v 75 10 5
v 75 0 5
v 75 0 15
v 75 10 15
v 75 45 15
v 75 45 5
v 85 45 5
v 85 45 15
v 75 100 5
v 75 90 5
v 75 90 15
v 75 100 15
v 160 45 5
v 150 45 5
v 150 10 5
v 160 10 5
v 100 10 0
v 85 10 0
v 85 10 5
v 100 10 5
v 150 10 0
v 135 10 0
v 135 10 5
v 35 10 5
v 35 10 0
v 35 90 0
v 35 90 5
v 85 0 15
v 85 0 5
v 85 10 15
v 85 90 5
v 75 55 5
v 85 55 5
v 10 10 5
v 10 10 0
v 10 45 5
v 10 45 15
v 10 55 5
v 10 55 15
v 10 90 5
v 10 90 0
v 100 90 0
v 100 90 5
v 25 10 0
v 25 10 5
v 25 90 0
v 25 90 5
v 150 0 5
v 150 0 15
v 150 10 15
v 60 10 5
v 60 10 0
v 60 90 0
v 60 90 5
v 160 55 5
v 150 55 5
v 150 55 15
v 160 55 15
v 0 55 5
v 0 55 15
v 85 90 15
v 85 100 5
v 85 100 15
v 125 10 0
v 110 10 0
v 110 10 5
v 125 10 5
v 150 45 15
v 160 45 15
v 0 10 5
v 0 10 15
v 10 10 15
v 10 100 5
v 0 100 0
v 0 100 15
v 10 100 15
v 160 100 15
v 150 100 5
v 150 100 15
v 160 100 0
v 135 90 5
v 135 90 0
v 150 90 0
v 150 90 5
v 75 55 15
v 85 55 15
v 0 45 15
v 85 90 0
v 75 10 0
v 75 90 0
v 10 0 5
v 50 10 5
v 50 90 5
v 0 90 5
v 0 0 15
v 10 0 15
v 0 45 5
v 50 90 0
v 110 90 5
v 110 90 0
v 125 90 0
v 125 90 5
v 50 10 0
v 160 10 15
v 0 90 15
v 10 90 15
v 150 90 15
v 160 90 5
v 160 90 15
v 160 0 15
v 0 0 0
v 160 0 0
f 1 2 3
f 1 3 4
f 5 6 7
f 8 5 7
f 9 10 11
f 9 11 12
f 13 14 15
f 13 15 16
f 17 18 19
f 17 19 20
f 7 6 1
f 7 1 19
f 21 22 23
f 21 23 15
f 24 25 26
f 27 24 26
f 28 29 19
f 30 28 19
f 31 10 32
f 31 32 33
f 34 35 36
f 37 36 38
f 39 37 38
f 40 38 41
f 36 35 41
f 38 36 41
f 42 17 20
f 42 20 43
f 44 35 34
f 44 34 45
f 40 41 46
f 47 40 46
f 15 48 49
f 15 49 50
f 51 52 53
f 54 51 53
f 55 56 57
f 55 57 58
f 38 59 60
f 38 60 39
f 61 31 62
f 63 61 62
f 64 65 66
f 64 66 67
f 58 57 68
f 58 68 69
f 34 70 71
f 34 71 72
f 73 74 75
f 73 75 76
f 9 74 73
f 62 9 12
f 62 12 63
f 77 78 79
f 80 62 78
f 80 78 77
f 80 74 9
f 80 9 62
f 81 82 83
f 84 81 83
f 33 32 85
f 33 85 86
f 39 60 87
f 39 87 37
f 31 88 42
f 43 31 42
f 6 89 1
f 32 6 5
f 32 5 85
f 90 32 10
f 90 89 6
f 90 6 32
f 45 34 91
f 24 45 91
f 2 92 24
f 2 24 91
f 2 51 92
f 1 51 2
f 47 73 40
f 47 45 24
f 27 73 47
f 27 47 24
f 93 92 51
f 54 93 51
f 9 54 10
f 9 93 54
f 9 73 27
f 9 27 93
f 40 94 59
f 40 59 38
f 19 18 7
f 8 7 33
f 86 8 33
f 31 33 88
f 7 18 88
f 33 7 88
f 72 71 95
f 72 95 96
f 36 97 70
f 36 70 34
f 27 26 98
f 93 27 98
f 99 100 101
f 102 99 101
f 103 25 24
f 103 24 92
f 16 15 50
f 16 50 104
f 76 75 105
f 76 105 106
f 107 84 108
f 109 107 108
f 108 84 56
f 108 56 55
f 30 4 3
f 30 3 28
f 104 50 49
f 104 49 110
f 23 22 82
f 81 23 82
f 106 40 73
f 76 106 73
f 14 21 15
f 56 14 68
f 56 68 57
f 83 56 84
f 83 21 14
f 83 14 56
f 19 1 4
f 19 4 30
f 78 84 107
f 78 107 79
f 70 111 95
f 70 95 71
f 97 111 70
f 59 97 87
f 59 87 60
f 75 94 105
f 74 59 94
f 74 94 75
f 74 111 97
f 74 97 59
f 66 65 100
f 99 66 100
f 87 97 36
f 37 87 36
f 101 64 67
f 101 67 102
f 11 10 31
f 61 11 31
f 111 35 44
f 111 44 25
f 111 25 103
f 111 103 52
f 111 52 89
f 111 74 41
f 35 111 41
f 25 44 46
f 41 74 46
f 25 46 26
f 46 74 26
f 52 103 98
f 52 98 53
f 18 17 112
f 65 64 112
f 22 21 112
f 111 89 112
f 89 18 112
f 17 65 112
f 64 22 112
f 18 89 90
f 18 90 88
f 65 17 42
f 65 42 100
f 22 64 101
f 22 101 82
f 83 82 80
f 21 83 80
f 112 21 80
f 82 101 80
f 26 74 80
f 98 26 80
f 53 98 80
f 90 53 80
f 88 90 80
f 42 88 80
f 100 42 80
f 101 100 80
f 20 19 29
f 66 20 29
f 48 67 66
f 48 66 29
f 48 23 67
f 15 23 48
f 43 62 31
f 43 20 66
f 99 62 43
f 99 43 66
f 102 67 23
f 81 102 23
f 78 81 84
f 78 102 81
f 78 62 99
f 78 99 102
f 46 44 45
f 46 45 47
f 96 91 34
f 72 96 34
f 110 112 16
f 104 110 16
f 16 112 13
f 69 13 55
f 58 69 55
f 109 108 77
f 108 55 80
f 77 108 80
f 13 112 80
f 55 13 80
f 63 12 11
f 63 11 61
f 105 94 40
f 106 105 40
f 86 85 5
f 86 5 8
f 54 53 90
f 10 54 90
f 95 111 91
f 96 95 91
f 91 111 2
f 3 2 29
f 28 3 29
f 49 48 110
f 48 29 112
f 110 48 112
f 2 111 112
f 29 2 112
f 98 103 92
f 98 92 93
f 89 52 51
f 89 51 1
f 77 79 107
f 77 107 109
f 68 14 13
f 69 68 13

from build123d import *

# Parameters (mm, degrees)
F0_W     = 160
F0_H     = 100
F0_W_2   = 15
F0_H_2   = 80
F1_DEPTH = 5
F2_W     = 10
F2_H     = 10
F3_DEPTH = 10


with BuildPart() as f1:
    # F0 (on Top) → F1 (new body)
    with BuildSketch(Plane.XY):
        with Locations((80, 50)):
            Rectangle(F0_W, F0_H)
        with Locations((17.5, 50)):
            Rectangle(F0_W_2, F0_H_2, mode=Mode.SUBTRACT)
        with Locations((42.5, 50)):
            Rectangle(F0_W_2, F0_H_2, mode=Mode.SUBTRACT)
        with Locations((67.5, 50)):
            Rectangle(F0_W_2, F0_H_2, mode=Mode.SUBTRACT)
        with Locations((92.5, 50)):
            Rectangle(F0_W_2, F0_H_2, mode=Mode.SUBTRACT)
        with Locations((117.5, 50)):
            Rectangle(F0_W_2, F0_H_2, mode=Mode.SUBTRACT)
        with Locations((142.5, 50)):
            Rectangle(F0_W_2, F0_H_2, mode=Mode.SUBTRACT)
    extrude(amount=F1_DEPTH)

    # F2 (on face) → F3 (join)
    with BuildSketch(Plane.XY.offset(5)):
        with Locations((5, 95)):
            Rectangle(F2_W, F2_H)
        with Locations((80, 95)):
            Rectangle(F2_W, F2_H)
        with Locations((155, 95)):
            Rectangle(F2_W, F2_H)
        with Locations((155, 50)):
            Rectangle(F2_W, F2_H)
        with Locations((80, 50)):
            Rectangle(F2_W, F2_H)
        with Locations((5, 50)):
            Rectangle(F2_W, F2_H)
        with Locations((5, 5)):
            Rectangle(F2_W, F2_H)
        with Locations((155, 5)):
            Rectangle(F2_W, F2_H)
        with Locations((80, 5)):
            Rectangle(F2_W, F2_H)
    extrude(amount=F3_DEPTH)


solid = f1.part
